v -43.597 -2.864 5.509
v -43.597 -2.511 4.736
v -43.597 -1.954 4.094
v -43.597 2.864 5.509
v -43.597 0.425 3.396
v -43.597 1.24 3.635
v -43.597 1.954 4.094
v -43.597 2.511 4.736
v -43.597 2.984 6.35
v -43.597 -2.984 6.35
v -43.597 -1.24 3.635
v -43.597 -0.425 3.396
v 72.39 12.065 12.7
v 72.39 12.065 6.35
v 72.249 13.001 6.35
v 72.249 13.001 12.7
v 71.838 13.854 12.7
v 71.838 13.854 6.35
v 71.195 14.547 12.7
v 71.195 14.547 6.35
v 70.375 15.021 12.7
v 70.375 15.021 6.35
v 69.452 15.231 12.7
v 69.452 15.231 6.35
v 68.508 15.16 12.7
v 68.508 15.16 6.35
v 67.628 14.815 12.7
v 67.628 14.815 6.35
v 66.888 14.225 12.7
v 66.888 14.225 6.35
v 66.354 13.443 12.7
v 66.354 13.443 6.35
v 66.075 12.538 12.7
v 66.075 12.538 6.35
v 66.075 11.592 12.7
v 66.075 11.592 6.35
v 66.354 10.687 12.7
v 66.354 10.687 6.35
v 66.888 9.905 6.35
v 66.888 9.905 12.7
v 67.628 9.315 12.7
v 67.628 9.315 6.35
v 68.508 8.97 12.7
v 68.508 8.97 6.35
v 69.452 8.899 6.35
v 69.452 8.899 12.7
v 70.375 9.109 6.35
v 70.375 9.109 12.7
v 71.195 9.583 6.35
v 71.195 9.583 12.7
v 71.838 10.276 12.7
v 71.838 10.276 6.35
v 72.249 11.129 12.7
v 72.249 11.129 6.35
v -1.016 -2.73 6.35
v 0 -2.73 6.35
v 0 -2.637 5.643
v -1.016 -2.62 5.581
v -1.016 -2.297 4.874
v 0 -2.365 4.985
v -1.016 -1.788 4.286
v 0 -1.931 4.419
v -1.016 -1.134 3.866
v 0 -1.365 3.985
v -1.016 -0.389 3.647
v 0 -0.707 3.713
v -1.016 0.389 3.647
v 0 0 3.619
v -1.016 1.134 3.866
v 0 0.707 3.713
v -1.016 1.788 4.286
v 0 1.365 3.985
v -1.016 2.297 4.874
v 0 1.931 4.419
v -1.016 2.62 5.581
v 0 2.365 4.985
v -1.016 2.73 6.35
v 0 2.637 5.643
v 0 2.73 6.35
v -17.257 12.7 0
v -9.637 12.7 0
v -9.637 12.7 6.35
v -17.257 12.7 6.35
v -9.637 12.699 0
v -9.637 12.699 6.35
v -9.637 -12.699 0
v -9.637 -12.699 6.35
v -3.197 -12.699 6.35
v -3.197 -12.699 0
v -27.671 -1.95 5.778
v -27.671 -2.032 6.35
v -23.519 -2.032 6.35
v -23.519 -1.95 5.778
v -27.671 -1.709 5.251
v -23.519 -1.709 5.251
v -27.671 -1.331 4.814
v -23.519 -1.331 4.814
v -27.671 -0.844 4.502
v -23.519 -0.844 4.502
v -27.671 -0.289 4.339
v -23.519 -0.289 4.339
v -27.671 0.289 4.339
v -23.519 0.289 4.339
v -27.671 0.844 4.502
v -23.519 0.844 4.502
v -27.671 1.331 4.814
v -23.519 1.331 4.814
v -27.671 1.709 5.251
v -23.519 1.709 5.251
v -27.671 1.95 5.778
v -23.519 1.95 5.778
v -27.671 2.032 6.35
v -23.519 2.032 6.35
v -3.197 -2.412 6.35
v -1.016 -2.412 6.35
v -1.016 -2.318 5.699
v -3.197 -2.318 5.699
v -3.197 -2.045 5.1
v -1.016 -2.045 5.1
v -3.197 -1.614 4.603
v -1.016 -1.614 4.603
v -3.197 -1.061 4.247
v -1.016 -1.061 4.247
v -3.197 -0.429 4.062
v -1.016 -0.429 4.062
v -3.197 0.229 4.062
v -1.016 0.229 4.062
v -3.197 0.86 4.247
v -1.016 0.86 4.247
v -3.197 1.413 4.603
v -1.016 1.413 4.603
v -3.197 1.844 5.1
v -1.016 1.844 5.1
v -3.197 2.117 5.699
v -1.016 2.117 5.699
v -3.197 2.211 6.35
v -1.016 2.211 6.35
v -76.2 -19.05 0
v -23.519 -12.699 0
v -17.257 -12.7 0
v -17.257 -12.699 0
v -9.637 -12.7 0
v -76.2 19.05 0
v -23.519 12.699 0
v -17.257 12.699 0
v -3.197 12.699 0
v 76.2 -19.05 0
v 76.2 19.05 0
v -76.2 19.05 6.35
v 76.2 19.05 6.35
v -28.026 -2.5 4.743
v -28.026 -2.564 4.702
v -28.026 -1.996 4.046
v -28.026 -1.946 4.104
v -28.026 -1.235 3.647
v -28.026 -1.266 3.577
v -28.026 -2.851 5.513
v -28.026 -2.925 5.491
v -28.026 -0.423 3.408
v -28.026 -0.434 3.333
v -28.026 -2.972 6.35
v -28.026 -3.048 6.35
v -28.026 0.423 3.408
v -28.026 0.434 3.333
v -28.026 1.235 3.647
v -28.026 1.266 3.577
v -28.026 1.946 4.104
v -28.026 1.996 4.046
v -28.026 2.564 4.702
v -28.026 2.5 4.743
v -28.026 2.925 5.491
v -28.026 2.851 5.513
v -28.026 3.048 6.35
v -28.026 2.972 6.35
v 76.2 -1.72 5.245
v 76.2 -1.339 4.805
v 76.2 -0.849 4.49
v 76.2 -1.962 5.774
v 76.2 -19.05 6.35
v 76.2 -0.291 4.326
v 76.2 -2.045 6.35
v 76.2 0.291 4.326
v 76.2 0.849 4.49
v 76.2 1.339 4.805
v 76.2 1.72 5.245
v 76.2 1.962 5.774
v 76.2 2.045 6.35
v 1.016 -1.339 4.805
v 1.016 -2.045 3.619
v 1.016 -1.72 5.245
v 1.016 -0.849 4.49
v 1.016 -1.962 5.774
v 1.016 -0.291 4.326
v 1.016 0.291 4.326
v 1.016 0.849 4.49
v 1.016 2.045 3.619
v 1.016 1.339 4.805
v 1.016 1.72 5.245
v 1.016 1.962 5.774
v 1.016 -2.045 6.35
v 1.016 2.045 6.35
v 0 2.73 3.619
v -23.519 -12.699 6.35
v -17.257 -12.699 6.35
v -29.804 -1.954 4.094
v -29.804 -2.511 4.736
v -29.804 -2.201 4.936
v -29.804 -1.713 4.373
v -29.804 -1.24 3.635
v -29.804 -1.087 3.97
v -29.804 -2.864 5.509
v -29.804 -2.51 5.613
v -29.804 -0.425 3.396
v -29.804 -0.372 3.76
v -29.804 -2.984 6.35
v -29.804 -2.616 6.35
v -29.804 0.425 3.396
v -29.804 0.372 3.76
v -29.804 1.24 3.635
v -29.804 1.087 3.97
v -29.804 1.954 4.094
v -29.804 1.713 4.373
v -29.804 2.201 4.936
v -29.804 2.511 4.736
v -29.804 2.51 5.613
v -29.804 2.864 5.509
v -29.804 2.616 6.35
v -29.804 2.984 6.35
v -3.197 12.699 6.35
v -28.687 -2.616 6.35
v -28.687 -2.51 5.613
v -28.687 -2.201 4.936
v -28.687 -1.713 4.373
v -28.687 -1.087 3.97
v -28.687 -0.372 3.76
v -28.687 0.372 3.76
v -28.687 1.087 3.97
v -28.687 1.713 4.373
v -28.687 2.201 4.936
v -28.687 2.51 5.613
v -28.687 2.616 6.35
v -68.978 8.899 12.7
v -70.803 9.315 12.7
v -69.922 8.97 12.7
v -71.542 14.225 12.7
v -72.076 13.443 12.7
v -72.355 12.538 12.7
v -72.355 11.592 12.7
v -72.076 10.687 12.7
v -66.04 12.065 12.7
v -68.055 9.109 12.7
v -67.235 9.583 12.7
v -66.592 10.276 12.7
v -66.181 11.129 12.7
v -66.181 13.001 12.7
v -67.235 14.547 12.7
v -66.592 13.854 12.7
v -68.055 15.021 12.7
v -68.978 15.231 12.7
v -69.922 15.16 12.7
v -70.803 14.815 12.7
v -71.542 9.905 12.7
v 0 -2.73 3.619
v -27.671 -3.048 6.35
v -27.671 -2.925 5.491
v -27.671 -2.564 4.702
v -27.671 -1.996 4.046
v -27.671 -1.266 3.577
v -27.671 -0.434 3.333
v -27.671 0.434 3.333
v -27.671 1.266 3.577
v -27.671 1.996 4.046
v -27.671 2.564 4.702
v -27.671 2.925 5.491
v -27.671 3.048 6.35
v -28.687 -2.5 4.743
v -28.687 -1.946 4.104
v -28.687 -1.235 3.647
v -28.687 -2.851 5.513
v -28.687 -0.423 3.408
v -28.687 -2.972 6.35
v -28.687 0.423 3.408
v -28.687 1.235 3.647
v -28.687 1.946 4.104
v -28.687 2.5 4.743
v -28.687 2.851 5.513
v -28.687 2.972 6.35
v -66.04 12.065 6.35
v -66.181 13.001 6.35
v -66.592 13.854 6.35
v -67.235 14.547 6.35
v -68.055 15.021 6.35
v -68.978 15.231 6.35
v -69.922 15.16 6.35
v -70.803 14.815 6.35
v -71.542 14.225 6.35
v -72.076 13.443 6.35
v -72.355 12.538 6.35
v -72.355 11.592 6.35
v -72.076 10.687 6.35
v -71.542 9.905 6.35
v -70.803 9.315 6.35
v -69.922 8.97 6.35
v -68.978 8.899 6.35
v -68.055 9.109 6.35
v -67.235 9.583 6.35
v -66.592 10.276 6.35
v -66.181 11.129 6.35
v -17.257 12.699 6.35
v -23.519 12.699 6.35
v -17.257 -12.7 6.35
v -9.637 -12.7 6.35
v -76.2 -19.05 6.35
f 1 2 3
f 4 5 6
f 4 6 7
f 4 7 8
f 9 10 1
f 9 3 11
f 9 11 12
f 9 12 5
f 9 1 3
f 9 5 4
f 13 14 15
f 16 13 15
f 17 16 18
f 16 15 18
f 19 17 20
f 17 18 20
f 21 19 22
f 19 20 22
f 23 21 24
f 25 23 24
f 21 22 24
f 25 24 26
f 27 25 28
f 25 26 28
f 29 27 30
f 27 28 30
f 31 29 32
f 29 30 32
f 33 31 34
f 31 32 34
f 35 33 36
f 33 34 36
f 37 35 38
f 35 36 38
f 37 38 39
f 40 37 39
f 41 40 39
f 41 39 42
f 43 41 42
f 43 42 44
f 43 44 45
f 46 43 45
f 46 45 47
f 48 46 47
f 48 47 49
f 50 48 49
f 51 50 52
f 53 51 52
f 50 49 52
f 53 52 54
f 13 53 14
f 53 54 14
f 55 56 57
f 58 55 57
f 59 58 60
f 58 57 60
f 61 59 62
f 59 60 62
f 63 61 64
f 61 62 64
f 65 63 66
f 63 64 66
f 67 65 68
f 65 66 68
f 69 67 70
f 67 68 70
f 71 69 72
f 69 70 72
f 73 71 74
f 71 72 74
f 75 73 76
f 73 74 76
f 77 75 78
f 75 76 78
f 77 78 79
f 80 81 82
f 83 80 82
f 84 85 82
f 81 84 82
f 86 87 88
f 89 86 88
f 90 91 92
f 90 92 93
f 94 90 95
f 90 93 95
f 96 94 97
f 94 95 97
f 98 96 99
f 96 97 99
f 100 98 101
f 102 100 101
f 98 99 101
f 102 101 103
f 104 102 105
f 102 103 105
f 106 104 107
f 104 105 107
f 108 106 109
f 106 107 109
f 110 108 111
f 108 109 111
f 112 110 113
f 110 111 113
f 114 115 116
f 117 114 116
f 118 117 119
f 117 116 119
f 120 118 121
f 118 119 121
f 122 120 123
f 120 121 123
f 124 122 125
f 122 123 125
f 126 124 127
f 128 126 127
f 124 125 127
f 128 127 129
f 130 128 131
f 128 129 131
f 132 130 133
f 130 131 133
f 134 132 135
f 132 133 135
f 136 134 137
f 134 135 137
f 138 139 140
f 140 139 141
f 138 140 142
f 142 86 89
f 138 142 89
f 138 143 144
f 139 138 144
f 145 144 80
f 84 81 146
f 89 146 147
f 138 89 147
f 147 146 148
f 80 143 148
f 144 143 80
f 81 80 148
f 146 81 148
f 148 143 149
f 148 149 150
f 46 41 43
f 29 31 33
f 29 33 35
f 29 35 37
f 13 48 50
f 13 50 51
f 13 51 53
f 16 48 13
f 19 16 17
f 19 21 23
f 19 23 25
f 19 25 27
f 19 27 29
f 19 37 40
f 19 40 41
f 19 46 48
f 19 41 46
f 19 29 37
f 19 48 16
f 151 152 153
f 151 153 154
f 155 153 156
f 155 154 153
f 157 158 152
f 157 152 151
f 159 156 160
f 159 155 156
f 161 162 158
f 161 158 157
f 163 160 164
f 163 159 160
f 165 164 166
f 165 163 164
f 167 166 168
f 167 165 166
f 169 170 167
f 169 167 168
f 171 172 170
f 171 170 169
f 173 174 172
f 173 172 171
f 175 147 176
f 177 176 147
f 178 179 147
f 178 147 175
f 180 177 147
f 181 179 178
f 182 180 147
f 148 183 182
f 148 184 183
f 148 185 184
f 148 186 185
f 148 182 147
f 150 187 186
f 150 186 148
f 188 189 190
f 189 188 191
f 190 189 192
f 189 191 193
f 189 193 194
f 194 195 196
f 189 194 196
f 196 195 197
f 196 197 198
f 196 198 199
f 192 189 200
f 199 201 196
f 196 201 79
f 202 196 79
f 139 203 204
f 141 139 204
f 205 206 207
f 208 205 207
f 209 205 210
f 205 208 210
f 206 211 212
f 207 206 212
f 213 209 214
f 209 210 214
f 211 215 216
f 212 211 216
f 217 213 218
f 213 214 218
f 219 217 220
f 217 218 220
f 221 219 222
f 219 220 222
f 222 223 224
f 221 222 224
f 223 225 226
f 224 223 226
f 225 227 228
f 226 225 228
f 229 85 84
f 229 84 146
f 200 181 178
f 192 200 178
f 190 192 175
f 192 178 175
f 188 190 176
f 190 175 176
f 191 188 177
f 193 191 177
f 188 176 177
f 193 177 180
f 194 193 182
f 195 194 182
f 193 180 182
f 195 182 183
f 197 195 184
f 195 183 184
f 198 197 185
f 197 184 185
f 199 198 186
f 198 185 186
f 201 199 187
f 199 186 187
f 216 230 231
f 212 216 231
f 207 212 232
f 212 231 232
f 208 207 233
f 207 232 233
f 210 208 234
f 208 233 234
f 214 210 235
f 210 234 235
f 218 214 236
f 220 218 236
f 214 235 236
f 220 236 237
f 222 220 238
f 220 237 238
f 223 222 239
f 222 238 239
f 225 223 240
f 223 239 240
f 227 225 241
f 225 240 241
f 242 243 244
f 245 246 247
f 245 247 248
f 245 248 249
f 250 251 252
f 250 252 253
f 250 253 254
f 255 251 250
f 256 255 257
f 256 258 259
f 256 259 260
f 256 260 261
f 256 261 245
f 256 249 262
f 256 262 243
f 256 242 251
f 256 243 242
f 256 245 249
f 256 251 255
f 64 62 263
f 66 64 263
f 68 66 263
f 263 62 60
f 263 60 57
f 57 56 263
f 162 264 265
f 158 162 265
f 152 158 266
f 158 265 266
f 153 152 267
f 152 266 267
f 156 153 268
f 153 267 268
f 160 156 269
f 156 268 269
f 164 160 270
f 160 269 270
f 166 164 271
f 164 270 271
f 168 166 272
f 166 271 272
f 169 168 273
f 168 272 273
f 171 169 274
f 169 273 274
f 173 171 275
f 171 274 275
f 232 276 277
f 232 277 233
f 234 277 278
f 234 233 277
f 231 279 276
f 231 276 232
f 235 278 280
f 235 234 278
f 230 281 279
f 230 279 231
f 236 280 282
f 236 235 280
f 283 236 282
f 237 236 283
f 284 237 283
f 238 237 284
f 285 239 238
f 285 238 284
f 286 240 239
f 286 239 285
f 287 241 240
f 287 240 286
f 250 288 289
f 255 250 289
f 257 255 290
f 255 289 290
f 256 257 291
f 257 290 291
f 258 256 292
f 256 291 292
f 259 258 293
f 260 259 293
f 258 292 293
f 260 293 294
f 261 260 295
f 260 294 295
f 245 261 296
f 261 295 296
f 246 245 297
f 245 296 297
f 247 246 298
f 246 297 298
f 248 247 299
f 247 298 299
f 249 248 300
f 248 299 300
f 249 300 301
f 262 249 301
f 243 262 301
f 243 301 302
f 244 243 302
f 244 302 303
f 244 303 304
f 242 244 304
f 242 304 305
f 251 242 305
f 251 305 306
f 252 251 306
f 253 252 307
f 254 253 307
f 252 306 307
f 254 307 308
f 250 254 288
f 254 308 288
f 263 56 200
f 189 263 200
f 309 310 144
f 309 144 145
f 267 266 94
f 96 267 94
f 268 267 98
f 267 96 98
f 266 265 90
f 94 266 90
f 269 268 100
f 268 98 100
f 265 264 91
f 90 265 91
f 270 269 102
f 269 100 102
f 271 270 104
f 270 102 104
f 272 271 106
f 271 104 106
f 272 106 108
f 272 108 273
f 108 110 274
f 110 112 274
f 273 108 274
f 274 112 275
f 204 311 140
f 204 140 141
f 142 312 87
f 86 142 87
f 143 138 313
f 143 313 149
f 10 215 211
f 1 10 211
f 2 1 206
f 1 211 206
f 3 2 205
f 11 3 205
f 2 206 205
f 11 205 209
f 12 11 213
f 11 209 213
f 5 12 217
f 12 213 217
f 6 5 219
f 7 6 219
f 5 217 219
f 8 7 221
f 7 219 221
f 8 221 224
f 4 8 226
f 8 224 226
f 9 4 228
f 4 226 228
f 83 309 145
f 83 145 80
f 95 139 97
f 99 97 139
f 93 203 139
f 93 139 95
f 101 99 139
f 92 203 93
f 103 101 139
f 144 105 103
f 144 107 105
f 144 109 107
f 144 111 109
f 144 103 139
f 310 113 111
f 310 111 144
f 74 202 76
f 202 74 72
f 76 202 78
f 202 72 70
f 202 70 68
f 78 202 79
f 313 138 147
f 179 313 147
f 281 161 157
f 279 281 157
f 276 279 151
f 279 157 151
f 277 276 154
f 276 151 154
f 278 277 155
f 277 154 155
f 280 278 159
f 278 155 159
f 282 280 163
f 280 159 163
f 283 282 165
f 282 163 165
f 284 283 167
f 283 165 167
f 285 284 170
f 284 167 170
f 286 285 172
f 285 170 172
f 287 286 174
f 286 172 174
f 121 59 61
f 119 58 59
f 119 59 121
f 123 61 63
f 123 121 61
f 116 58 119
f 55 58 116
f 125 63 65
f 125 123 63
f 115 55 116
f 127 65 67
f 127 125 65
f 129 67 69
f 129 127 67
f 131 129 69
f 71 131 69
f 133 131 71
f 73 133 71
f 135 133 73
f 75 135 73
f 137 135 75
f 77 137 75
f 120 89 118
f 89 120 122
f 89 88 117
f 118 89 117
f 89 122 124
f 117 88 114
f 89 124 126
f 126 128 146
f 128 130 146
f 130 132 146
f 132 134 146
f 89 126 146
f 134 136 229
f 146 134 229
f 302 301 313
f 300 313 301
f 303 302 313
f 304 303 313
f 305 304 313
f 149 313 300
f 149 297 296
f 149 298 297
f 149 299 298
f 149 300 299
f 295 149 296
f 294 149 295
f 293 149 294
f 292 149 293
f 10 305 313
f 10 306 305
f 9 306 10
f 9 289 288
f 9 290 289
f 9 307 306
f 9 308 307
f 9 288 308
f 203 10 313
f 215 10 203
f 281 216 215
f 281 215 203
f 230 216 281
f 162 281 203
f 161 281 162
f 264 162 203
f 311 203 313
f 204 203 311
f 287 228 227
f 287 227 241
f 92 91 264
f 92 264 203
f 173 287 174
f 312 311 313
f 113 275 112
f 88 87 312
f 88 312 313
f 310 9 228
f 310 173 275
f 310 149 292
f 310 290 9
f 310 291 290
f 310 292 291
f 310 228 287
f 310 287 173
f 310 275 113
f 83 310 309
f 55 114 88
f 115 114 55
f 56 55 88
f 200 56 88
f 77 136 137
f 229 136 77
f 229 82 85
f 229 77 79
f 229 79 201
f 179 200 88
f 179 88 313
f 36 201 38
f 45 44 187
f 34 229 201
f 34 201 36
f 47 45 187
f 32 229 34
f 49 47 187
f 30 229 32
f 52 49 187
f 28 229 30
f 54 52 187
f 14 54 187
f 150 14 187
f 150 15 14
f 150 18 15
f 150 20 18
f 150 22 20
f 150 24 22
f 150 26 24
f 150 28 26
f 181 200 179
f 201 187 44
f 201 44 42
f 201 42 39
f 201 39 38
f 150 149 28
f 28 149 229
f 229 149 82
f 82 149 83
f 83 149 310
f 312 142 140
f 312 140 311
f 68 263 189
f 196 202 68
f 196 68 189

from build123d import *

# Parameters (mm, degrees)
F0_W      = 152.4
F0_H      = 38.1
F1_DEPTH  = 6.35
F2_R      = 2.0447
F3_DEPTH  = 76.2
F4_DEPTH  = 76.2
F5_R      = 2.7305
F6_DEPTH  = 1.016
F8_DEPTH  = 7.62
F9_R      = 3.5941
F10_DEPTH = 1.905
F11_R     = 4.7625
F12_DEPTH = 0.635
F13_R     = 1.524
F14_DEPTH = 1.00076
F15_W     = 25.4
F15_H     = 38.1
F16_DEPTH = 7.62
F18_DEPTH = 1.27
F19_R     = 3.2131
F20_DEPTH = 0.508
F22_DEPTH = 0.762
F23_R     = 2.032
F24_DEPTH = 8.382
F25_R     = 3.048
F26_DEPTH = 0.3556
F27_R     = 2.9718
F28_DEPTH = 0.6604
F29_R     = 2.6162
F30_DEPTH = 1.1176
F31_R     = 2.9845
F32_DEPTH = 13.7922
F33_R     = 3.175
F34_DEPTH = 6.35
F36_DEPTH = 2.7305
F37_W     = 20.3219614923
F37_H     = 25.3980793059
F38_DEPTH = 25.4


with BuildPart() as f1:
    # F0 (on Top) → F1 (new body)
    with BuildSketch(Plane.XY):
        Rectangle(F0_W, F0_H)
    extrude(amount=F1_DEPTH)

    # F2 (on face) → F3 (join)
    with BuildSketch(Plane.YZ.offset(76.2)):
        with Locations((0, 6.35)):
            Circle(F2_R)
    extrude(amount=-F3_DEPTH)

    # F2 (on face) → F4 (cut)
    with BuildSketch(Plane.YZ.offset(76.2)):
        with Locations((0, 6.35)):
            Circle(F2_R)
    extrude(amount=-F4_DEPTH, mode=Mode.SUBTRACT)

    # F5 (on face) → F6 (cut)
    with BuildSketch(Plane.YZ):
        with Locations((0, 6.35)):
            Circle(F5_R)
    extrude(amount=-F6_DEPTH, mode=Mode.SUBTRACT)

    # F7 (on face) → F8 (cut)
    with BuildSketch(Plane.YZ.offset(-1.016)):
        with BuildLine():
            ThreePointArc((-2.4118311998, 6.35), (-0.1004311998, 4.0386), (2.2109688002, 6.35))
            Line((2.2109688002, 6.35), (-2.4118311998, 6.35))
        make_face()
    extrude(amount=-F8_DEPTH, mode=Mode.SUBTRACT)

    # F9 (on face) → F10 (cut)
    with BuildSketch(Plane.YZ.offset(-8.636)):
        with Locations((-0.1004311998, 6.35)):
            Circle(F9_R)
    extrude(amount=F10_DEPTH, mode=Mode.SUBTRACT)

    # F11 (on face) → F12 (cut)
    with BuildSketch(Plane.YZ.offset(-8.636)):
        with Locations((0, 6.35)):
            Circle(F11_R)
        with BuildLine():
            ThreePointArc((3.4936688002, 6.35), (-0.1004311998, 2.7559), (-3.6945311998, 6.35))
            Line((-3.6945311998, 6.35), (3.4936688002, 6.35))
        make_face(mode=Mode.SUBTRACT)
    extrude(amount=F12_DEPTH, mode=Mode.SUBTRACT)

    # F13 (on face) → F14 (cut)
    with BuildSketch(Plane.YZ.offset(-8.636)):
        with Locations((0, 6.35)):
            Circle(F13_R)
    extrude(amount=-F14_DEPTH, mode=Mode.SUBTRACT)

    # F15 (on face) → F16 (cut)
    with BuildSketch(Plane.YZ.offset(-9.63676)):
        with Locations((0, 6.35)):
            Rectangle(F15_W, F15_H)
    extrude(amount=-F16_DEPTH, mode=Mode.SUBTRACT)

    # F17 (on face) → F18 (cut)
    with BuildSketch(Plane.YZ.offset(-17.25676)):
        with BuildLine():
            ThreePointArc((-1.524, 6.35), (0, 4.826), (1.524, 6.35))
            Line((1.524, 6.35), (-1.524, 6.35))
        make_face()
        with BuildLine():
            Line((-1.524, 6.35), (1.524, 6.35))
            ThreePointArc((1.524, 6.35), (0, 7.874), (-1.524, 6.35))
        make_face()
    extrude(amount=-F18_DEPTH, mode=Mode.SUBTRACT)

    # F19 (on face) → F20 (cut)
    with BuildSketch(Plane.YZ.offset(-18.52676)):
        with Locations((0, 6.35)):
            Circle(F19_R)
        with BuildLine():
            ThreePointArc((1.524, 6.35), (0, 4.826), (-1.524, 6.35))
            Line((-1.524, 6.35), (1.524, 6.35))
        make_face(mode=Mode.SUBTRACT)
    extrude(amount=F20_DEPTH, mode=Mode.SUBTRACT)

    # F21 (on face) → F22 (cut)
    with BuildSketch(Plane.YZ.offset(-18.52676)):
        with BuildLine():
            ThreePointArc((-2.9337, 6.35), (0, 3.4163), (2.9337, 6.35))
            Line((2.9337, 6.35), (-2.9337, 6.35))
        make_face()
        with BuildLine():
            Line((-2.9337, 6.35), (2.9337, 6.35))
            ThreePointArc((2.9337, 6.35), (0, 9.2837), (-2.9337, 6.35))
        make_face()
    extrude(amount=-F22_DEPTH, mode=Mode.SUBTRACT)

    # F23 (on face) → F24 (cut)
    with BuildSketch(Plane.YZ.offset(-19.28876)):
        with Locations((0, 6.35)):
            Circle(F23_R)
    extrude(amount=-F24_DEPTH, mode=Mode.SUBTRACT)

    # F25 (on face) → F26 (cut)
    with BuildSketch(Plane.YZ.offset(-27.67076)):
        with Locations((0, 6.35)):
            Circle(F25_R)
    extrude(amount=-F26_DEPTH, mode=Mode.SUBTRACT)

    # F27 (on face) → F28 (cut)
    with BuildSketch(Plane.YZ.offset(-28.02636)):
        with Locations((0, 6.35)):
            Circle(F27_R)
    extrude(amount=-F28_DEPTH, mode=Mode.SUBTRACT)

    # F29 (on face) → F30 (cut)
    with BuildSketch(Plane.YZ.offset(-28.68676)):
        with Locations((0, 6.35)):
            Circle(F29_R)
    extrude(amount=-F30_DEPTH, mode=Mode.SUBTRACT)

    # F31 (on face) → F32 (cut)
    with BuildSketch(Plane.YZ.offset(-29.80436)):
        with Locations((0, 6.35)):
            Circle(F31_R)
    extrude(amount=-F32_DEPTH, mode=Mode.SUBTRACT)

    # F33 (on face) → F34 (join)
    with BuildSketch(Plane.XY.offset(6.35)):
        with Locations((-69.215, 12.065)):
            Circle(F33_R)
        with Locations((69.215, 12.065)):
            Circle(F33_R)
    extrude(amount=F34_DEPTH)

    # F35 (on face) → F36 (cut)
    with BuildSketch(Plane.XY.offset(6.35)):
        Polygon((1.016, 2.0447), (0, 2.7305), (0, -2.7305), (1.016, -2.0447), align=None)
    extrude(amount=-F36_DEPTH, mode=Mode.SUBTRACT)

    # F37 (on face) → F38 (cut)
    with BuildSketch(Plane.XY.offset(6.35)):
        with Locations((-13.3582856506, 0)):
            Rectangle(F37_W, F37_H)
    extrude(amount=-F38_DEPTH, mode=Mode.SUBTRACT)


solid = f1.part
